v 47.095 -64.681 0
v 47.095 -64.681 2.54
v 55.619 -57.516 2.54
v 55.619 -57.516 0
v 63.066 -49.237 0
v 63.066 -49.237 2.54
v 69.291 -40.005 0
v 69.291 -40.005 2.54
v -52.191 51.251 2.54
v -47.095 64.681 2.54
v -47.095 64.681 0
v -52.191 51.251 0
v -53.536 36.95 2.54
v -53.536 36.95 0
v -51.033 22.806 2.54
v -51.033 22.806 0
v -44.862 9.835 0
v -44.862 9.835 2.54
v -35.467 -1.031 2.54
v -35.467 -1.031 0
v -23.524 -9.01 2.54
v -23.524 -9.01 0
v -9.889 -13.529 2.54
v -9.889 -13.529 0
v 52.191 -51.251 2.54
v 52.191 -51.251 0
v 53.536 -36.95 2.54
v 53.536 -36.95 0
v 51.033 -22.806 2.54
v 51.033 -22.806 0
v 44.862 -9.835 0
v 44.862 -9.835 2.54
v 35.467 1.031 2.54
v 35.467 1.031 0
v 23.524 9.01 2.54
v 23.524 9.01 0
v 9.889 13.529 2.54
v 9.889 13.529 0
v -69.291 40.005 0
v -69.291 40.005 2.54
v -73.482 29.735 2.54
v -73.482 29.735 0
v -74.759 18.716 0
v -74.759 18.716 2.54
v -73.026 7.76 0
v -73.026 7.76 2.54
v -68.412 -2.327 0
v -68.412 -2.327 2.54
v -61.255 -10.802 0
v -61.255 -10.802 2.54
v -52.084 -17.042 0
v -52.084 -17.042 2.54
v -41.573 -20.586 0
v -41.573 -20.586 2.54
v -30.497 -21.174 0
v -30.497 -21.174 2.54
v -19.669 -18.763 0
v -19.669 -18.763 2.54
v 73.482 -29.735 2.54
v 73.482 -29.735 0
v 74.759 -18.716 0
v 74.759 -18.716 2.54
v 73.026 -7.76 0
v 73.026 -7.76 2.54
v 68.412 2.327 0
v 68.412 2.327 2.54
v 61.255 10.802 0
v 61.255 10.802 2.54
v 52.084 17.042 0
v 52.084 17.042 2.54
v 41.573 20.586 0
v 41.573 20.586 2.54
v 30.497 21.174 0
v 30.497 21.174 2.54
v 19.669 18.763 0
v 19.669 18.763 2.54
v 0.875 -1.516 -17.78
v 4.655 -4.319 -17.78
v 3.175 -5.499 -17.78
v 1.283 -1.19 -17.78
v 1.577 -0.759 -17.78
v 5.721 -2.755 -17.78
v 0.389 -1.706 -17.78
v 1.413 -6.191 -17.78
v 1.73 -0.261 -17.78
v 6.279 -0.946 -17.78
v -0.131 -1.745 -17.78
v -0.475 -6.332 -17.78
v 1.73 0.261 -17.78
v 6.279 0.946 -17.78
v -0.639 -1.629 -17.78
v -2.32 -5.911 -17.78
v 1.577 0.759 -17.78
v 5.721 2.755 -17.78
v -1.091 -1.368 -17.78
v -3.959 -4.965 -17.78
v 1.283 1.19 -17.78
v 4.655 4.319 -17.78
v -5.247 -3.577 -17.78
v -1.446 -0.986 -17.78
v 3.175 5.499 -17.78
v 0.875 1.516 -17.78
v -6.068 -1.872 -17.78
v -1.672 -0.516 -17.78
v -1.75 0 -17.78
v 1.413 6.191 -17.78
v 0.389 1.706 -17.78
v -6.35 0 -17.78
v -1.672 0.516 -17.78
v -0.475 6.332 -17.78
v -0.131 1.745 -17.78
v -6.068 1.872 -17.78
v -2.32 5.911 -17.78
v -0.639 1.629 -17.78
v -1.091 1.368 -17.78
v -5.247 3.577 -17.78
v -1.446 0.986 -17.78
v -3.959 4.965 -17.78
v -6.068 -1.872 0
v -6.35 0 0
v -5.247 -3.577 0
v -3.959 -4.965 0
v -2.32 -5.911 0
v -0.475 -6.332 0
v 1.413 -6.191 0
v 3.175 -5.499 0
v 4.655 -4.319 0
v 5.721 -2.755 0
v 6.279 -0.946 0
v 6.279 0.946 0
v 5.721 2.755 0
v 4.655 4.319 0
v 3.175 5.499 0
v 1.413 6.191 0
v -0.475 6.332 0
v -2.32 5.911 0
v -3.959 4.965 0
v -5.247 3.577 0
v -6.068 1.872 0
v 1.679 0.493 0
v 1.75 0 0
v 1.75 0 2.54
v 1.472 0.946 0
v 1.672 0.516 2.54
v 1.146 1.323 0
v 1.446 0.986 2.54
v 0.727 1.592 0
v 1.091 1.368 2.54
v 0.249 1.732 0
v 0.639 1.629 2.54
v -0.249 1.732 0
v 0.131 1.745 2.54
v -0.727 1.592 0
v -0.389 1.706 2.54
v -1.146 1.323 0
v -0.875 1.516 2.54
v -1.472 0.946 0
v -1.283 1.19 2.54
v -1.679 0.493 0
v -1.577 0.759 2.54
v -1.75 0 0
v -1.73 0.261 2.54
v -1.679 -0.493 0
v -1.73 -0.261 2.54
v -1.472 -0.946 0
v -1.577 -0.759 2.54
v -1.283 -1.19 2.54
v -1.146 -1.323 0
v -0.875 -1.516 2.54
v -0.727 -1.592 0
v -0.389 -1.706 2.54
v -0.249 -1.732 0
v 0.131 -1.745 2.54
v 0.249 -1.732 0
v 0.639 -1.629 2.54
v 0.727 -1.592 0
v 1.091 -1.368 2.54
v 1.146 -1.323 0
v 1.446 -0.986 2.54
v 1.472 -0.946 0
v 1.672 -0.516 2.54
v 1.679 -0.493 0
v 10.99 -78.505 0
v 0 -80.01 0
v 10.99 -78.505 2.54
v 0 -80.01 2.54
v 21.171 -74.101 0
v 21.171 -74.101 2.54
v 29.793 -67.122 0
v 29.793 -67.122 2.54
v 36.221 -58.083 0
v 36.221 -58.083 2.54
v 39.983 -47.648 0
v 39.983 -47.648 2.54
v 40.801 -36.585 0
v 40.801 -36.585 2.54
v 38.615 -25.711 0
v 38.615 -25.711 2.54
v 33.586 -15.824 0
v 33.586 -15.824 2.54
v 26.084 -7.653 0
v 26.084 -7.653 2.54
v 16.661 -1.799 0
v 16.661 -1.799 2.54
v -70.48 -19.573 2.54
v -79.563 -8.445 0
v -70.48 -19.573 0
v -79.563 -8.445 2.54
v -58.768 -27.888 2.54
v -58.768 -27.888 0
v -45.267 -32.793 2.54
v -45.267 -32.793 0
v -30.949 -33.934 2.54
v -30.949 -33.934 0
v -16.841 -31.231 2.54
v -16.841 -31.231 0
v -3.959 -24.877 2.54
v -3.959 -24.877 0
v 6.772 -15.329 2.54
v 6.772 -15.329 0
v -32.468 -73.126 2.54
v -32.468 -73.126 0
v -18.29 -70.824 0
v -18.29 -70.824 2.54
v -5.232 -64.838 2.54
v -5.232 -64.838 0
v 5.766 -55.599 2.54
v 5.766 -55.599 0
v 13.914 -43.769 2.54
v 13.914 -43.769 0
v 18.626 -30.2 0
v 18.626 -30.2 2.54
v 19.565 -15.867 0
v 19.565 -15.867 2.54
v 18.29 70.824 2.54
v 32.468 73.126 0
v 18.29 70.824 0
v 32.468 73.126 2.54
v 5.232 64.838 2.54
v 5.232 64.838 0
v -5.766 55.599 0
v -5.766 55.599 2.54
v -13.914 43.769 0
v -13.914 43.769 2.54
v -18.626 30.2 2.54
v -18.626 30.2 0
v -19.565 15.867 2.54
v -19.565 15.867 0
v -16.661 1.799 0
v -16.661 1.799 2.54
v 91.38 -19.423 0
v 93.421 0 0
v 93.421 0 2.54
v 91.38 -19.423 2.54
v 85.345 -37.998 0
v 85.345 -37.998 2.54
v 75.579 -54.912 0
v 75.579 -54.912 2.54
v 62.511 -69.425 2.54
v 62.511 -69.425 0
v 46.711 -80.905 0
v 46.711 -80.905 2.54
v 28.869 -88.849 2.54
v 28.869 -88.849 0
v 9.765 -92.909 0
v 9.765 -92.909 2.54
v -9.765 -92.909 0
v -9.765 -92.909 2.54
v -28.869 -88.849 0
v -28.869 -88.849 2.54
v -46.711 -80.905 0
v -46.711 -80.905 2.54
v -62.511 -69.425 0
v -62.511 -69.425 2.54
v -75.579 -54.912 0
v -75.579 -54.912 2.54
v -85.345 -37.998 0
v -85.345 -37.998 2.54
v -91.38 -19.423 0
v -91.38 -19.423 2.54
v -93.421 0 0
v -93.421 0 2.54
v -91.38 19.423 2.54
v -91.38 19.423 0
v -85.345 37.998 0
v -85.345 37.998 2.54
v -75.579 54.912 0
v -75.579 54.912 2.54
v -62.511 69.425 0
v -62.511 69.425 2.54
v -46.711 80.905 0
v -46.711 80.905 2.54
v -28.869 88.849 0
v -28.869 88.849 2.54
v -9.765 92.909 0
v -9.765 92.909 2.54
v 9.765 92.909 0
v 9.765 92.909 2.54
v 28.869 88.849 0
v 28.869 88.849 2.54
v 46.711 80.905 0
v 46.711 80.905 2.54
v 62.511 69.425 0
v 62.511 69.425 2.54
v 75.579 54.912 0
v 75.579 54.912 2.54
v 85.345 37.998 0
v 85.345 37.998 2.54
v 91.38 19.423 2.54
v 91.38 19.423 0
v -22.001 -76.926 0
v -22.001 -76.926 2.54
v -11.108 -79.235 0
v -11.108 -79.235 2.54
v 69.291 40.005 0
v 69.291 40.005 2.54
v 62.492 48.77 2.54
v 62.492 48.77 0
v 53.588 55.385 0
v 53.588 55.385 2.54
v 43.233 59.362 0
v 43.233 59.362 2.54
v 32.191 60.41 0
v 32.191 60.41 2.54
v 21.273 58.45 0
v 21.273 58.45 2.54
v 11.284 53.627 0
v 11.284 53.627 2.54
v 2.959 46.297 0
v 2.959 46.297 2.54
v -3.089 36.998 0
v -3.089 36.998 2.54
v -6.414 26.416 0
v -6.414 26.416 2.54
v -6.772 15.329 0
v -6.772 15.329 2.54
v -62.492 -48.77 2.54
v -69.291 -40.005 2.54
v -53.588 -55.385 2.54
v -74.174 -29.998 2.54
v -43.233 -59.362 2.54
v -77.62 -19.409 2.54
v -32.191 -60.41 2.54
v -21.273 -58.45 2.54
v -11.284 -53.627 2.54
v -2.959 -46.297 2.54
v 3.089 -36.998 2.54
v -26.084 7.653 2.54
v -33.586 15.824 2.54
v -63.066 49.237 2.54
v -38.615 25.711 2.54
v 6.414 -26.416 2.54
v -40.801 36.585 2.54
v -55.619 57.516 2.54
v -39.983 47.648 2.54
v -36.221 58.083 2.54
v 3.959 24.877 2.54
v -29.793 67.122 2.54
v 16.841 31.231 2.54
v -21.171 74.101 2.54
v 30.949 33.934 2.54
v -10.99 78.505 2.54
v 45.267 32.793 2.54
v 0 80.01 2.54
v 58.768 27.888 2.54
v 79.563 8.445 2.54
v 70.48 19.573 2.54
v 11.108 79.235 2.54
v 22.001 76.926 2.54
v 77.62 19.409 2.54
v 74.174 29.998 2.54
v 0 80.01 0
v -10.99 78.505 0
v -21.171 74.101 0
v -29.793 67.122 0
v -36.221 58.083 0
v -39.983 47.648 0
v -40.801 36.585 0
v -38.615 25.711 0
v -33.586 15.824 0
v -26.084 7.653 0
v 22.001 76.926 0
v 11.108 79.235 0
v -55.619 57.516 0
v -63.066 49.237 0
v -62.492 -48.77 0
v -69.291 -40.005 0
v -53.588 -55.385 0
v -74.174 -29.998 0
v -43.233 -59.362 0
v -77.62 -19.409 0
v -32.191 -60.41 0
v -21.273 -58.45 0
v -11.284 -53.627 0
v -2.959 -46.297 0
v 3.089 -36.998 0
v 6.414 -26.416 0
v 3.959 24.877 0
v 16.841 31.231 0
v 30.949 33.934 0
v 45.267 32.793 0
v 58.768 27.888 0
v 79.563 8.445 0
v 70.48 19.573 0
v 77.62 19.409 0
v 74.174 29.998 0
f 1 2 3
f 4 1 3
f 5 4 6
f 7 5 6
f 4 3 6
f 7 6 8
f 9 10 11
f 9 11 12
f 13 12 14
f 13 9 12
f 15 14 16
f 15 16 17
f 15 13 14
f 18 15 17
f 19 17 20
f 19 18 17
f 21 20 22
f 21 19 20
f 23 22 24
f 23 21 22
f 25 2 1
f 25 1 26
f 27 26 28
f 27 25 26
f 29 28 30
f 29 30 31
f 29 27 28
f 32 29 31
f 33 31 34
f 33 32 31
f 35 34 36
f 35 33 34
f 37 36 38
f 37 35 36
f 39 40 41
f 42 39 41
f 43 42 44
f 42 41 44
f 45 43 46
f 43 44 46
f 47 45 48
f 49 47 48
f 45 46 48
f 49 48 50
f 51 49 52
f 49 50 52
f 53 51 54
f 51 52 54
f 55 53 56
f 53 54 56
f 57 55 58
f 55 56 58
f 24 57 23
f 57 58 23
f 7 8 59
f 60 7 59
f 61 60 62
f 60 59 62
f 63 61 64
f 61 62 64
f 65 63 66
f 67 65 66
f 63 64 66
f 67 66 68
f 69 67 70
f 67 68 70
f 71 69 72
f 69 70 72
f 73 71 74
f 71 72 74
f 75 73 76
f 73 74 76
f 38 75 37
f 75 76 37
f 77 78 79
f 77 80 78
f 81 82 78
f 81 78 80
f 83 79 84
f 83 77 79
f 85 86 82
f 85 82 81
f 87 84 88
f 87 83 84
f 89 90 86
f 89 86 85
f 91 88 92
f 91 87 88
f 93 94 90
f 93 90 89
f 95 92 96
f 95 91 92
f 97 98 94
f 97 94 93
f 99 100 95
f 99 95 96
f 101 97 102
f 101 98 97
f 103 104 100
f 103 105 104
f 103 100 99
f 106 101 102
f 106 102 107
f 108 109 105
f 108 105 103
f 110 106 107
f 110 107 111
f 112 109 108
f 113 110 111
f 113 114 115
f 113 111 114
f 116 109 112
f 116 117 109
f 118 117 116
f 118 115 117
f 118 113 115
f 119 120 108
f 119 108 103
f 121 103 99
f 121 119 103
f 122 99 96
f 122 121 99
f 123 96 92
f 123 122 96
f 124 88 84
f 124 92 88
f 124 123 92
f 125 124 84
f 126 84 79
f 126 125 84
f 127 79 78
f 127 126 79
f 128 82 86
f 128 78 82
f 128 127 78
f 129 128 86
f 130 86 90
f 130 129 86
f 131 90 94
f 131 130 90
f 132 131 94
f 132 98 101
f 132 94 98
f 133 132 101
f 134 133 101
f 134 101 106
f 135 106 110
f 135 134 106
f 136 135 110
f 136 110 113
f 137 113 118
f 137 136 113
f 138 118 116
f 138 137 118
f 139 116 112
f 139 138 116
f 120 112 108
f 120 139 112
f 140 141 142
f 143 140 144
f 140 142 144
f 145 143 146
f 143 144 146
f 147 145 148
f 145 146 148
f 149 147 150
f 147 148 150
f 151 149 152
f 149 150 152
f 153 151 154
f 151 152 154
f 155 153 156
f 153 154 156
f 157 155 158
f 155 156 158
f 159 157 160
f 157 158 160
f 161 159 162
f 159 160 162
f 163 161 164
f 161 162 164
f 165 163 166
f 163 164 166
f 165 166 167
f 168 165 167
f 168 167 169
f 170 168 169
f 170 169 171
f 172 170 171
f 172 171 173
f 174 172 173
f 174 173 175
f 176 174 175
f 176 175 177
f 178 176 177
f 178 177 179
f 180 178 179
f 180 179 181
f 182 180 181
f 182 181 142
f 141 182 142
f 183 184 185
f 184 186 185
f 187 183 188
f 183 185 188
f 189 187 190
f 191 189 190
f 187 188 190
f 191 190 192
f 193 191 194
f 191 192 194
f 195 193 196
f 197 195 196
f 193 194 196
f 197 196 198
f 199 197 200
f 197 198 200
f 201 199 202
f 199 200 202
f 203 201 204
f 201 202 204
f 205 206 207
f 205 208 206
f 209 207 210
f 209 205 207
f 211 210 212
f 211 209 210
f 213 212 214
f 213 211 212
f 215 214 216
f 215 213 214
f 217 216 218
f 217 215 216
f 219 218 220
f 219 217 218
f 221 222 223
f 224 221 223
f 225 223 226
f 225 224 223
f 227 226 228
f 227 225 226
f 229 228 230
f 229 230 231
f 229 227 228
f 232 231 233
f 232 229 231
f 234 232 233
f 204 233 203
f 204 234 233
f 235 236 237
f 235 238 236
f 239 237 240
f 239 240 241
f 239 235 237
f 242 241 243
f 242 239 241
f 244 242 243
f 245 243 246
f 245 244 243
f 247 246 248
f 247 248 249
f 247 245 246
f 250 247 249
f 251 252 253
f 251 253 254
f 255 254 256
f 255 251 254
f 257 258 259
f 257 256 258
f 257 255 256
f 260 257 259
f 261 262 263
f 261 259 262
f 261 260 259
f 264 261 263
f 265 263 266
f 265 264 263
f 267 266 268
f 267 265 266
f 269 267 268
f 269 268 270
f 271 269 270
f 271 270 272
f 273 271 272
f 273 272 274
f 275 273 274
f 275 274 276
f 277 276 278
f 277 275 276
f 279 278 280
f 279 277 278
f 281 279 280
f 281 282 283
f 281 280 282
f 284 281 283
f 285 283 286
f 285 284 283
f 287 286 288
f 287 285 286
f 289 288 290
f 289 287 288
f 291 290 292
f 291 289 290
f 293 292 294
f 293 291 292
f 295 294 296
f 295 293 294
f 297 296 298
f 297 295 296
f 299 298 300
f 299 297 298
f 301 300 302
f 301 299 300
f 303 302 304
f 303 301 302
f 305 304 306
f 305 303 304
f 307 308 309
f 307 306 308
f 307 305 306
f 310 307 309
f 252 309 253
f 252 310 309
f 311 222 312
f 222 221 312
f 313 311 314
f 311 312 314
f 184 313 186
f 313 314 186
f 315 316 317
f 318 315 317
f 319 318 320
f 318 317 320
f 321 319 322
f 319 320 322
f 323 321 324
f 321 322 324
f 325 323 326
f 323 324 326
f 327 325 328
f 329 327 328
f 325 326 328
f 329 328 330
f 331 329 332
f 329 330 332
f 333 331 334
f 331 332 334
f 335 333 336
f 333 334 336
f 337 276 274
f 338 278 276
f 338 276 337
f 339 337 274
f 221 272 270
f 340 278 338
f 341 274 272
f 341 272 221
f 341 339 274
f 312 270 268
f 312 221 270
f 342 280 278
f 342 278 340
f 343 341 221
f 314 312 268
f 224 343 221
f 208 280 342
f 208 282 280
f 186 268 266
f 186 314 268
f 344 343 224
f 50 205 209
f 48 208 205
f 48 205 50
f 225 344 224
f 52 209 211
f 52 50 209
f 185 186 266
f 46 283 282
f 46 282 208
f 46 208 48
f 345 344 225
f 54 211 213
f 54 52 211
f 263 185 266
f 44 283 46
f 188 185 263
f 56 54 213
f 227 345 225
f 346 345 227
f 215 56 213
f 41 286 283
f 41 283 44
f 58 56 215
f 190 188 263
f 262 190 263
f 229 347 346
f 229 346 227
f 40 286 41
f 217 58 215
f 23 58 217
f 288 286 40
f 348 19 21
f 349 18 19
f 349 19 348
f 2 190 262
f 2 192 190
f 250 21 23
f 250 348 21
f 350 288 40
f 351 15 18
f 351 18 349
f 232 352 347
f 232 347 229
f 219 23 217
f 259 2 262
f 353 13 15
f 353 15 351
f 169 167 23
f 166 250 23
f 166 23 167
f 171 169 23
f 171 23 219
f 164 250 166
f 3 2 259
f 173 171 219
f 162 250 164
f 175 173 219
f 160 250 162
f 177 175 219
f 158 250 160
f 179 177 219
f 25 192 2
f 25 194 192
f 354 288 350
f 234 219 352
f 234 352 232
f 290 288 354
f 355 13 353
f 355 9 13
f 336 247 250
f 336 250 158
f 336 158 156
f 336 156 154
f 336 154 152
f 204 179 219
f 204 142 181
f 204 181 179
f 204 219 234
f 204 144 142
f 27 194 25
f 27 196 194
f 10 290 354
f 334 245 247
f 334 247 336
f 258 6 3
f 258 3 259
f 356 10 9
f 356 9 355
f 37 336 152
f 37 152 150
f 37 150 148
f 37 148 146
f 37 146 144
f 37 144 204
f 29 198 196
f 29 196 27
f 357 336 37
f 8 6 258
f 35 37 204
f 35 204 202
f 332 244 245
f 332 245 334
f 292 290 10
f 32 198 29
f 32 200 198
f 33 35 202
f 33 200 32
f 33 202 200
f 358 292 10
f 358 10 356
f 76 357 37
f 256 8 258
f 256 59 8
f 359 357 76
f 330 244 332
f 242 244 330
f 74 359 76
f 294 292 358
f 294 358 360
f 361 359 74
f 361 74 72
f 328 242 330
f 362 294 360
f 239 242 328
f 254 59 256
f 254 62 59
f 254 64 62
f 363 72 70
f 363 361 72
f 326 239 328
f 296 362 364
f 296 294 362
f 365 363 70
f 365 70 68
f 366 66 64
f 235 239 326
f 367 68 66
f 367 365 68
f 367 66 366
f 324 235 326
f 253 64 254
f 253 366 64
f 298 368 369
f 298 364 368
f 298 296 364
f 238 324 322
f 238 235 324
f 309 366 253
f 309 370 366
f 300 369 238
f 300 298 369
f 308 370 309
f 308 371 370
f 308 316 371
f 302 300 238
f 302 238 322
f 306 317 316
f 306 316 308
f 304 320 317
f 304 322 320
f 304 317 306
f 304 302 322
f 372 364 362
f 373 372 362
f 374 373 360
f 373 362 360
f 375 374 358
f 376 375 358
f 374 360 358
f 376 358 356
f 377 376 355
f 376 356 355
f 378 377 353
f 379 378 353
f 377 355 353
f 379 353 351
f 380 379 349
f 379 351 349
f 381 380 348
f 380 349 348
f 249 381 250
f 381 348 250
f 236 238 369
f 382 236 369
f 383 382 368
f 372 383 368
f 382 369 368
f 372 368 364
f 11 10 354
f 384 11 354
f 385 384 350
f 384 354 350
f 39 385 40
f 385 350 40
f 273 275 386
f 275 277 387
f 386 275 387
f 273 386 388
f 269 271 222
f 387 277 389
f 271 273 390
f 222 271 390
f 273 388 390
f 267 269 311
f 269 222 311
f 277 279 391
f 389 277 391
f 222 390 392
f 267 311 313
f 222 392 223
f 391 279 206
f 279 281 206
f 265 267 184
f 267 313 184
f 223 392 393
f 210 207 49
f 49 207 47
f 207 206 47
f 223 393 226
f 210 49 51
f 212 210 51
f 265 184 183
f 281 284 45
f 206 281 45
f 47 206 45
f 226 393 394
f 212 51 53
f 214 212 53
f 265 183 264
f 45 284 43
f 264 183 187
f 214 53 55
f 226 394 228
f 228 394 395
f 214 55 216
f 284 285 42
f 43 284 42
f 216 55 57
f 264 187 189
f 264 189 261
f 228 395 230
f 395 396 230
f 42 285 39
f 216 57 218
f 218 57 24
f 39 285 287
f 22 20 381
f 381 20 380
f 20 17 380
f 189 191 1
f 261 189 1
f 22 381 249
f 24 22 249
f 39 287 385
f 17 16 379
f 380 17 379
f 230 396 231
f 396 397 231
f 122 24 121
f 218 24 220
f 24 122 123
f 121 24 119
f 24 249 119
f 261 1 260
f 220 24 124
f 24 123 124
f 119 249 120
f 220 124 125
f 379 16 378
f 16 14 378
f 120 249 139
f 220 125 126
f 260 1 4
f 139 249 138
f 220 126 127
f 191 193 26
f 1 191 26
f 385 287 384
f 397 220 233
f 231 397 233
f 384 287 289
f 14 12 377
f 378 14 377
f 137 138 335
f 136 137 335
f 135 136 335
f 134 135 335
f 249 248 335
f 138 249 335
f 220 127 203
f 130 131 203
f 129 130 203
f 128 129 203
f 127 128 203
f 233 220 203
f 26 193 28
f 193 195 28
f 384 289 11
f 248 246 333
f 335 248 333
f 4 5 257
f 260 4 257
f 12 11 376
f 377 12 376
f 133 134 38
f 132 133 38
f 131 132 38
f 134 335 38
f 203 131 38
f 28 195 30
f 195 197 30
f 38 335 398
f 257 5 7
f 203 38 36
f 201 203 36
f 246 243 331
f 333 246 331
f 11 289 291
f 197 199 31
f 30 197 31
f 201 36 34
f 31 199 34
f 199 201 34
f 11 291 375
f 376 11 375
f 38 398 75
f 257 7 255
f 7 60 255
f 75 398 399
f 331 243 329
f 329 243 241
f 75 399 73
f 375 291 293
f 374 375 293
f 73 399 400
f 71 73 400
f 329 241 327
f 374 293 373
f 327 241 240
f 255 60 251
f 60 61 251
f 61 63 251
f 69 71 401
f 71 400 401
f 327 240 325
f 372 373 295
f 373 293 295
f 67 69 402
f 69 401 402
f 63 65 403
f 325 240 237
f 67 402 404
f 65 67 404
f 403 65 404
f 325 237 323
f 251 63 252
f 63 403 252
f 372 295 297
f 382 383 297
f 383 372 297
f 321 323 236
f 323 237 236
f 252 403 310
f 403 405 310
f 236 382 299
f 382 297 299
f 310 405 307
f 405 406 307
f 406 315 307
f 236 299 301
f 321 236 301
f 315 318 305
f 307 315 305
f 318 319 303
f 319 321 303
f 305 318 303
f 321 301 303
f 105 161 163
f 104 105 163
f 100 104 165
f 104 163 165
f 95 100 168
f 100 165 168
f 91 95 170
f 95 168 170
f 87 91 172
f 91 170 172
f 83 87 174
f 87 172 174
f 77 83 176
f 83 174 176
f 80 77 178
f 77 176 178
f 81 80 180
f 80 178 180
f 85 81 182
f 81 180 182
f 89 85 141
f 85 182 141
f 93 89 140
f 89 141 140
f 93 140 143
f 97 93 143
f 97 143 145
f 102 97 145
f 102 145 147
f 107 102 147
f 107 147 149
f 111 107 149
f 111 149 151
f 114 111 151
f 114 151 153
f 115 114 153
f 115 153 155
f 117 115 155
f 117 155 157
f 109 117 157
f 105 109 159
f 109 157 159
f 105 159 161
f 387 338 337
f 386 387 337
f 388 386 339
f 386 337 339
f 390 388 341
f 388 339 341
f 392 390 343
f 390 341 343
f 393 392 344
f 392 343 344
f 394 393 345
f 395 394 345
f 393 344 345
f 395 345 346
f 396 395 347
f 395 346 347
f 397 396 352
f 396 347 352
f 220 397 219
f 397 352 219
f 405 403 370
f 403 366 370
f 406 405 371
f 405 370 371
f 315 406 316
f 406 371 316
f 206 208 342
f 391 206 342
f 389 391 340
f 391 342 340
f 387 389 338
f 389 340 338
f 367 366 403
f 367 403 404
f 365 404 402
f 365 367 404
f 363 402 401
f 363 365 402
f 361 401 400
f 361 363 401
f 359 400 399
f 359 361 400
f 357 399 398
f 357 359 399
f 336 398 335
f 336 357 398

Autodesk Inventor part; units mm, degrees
ref_plane "YZ Plane" through (0, 0, 0) normal (1, 0, 0) x (0, 1, 0)
ref_plane "XZ Plane" through (0, 0, 0) normal (0, 1, 0) x (-1, 0, 0)
ref_plane "XY Plane" through (0, 0, 0) normal (0, 0, 1) x (1, 0, 0)
sketch "Sketch1" plane through (0, 0, 0) normal (0, 0, 1) x (1, 0, 0)
  circle A0 centre (0, 0) radius 93.4212
  dimension "d0" = 186.8424
extrude "Extrusion1" add sketch "Sketch1" along normal blind 2.54
sketch "Sketch2" plane through (0, 0, 2.54) normal (0, 0, 1) x (1, 0, 0)
  circle A0 centre (0, 0) radius 1.75
  circle A1 centre (0, 0) radius 14.45
  circle A2 centre (0, 0) radius 92.71
  circle A3 centre (0, 0) radius 80.01
  arc A4 (0, -80.01) -> (0, 1.75) centre (0, -39.13) ccw
  arc A5 (0, -92.71) -> (0, 14.45) centre (0, -39.13) ccw
  arc A6 (80.2892, -46.355) -> (-12.5141, 7.225) centre (33.8876, -19.565) ccw
  arc A7 (69.2907, -40.005) -> (-1.5155, 0.875) centre (33.8876, -19.565) ccw
  arc A8 (80.2892, 46.355) -> (-12.5141, -7.225) centre (33.8876, 19.565) ccw
  arc A9 (69.2907, 40.005) -> (-1.5155, -0.875) centre (33.8876, 19.565) ccw
  arc A10 (0, 92.71) -> (0, -14.45) centre (0, 39.13) ccw
  arc A11 (0, 80.01) -> (0, -1.75) centre (0, 39.13) ccw
  arc A12 (-80.2892, 46.355) -> (12.5141, -7.225) centre (-33.8876, 19.565) ccw
  arc A13 (-69.2907, 40.005) -> (1.5155, -0.875) centre (-33.8876, 19.565) ccw
  arc A14 (-80.2892, -46.355) -> (12.5141, 7.225) centre (-33.8876, -19.565) ccw
  arc A15 (-69.2907, -40.005) -> (1.5155, 0.875) centre (-33.8876, -19.565) ccw
  point P0 (-69.2907, -40.005)
  point P1 (6.7724, -15.3289)
  point P2 (-79.5631, -8.4451)
  point P3 (16.6614, -1.7994)
  point P4 (-32.4678, -73.1262)
  point P5 (9.8891, 13.5295)
  point P6 (47.0952, -64.6811)
  point P7 (69.2907, 40.005)
  point P8 (-6.7724, 15.3289)
  point P9 (79.5631, 8.4451)
  point P10 (0, 80.01)
  point P11 (-16.6614, 1.7994)
  point P12 (32.4678, 73.1262)
  point P13 (-9.8891, -13.5295)
  point P14 (-47.0952, 64.6811)
  dimension "d3" = 3.5
  dimension "d15" = 12.7
  dimension "d17" = 185.42
  dimension "d18" = 160.02
  dimension "d21" = 360
extrude "Extrusion2" cut sketch "Sketch2" against normal blind 2.54 contours A0 | A15 A3 A12 | A13 A3 A10 | A4 A3 A14 | A11 A3 A8 | A7 A3 A5 | A9 A3 A6
sketch "Sketch4" plane through (0, 0, 0) normal (0, 0, -1) x (-1, 0, 0)
  circle A0 centre (0, 0) radius 6.35
  circle A1 centre (0, 0) radius 1.75
  dimension "d11" = 12.7
  dimension "d10" = 3.5
extrude "Extrusion4" add sketch "Sketch4" along normal blind 17.78
properties part number "gear backing"
